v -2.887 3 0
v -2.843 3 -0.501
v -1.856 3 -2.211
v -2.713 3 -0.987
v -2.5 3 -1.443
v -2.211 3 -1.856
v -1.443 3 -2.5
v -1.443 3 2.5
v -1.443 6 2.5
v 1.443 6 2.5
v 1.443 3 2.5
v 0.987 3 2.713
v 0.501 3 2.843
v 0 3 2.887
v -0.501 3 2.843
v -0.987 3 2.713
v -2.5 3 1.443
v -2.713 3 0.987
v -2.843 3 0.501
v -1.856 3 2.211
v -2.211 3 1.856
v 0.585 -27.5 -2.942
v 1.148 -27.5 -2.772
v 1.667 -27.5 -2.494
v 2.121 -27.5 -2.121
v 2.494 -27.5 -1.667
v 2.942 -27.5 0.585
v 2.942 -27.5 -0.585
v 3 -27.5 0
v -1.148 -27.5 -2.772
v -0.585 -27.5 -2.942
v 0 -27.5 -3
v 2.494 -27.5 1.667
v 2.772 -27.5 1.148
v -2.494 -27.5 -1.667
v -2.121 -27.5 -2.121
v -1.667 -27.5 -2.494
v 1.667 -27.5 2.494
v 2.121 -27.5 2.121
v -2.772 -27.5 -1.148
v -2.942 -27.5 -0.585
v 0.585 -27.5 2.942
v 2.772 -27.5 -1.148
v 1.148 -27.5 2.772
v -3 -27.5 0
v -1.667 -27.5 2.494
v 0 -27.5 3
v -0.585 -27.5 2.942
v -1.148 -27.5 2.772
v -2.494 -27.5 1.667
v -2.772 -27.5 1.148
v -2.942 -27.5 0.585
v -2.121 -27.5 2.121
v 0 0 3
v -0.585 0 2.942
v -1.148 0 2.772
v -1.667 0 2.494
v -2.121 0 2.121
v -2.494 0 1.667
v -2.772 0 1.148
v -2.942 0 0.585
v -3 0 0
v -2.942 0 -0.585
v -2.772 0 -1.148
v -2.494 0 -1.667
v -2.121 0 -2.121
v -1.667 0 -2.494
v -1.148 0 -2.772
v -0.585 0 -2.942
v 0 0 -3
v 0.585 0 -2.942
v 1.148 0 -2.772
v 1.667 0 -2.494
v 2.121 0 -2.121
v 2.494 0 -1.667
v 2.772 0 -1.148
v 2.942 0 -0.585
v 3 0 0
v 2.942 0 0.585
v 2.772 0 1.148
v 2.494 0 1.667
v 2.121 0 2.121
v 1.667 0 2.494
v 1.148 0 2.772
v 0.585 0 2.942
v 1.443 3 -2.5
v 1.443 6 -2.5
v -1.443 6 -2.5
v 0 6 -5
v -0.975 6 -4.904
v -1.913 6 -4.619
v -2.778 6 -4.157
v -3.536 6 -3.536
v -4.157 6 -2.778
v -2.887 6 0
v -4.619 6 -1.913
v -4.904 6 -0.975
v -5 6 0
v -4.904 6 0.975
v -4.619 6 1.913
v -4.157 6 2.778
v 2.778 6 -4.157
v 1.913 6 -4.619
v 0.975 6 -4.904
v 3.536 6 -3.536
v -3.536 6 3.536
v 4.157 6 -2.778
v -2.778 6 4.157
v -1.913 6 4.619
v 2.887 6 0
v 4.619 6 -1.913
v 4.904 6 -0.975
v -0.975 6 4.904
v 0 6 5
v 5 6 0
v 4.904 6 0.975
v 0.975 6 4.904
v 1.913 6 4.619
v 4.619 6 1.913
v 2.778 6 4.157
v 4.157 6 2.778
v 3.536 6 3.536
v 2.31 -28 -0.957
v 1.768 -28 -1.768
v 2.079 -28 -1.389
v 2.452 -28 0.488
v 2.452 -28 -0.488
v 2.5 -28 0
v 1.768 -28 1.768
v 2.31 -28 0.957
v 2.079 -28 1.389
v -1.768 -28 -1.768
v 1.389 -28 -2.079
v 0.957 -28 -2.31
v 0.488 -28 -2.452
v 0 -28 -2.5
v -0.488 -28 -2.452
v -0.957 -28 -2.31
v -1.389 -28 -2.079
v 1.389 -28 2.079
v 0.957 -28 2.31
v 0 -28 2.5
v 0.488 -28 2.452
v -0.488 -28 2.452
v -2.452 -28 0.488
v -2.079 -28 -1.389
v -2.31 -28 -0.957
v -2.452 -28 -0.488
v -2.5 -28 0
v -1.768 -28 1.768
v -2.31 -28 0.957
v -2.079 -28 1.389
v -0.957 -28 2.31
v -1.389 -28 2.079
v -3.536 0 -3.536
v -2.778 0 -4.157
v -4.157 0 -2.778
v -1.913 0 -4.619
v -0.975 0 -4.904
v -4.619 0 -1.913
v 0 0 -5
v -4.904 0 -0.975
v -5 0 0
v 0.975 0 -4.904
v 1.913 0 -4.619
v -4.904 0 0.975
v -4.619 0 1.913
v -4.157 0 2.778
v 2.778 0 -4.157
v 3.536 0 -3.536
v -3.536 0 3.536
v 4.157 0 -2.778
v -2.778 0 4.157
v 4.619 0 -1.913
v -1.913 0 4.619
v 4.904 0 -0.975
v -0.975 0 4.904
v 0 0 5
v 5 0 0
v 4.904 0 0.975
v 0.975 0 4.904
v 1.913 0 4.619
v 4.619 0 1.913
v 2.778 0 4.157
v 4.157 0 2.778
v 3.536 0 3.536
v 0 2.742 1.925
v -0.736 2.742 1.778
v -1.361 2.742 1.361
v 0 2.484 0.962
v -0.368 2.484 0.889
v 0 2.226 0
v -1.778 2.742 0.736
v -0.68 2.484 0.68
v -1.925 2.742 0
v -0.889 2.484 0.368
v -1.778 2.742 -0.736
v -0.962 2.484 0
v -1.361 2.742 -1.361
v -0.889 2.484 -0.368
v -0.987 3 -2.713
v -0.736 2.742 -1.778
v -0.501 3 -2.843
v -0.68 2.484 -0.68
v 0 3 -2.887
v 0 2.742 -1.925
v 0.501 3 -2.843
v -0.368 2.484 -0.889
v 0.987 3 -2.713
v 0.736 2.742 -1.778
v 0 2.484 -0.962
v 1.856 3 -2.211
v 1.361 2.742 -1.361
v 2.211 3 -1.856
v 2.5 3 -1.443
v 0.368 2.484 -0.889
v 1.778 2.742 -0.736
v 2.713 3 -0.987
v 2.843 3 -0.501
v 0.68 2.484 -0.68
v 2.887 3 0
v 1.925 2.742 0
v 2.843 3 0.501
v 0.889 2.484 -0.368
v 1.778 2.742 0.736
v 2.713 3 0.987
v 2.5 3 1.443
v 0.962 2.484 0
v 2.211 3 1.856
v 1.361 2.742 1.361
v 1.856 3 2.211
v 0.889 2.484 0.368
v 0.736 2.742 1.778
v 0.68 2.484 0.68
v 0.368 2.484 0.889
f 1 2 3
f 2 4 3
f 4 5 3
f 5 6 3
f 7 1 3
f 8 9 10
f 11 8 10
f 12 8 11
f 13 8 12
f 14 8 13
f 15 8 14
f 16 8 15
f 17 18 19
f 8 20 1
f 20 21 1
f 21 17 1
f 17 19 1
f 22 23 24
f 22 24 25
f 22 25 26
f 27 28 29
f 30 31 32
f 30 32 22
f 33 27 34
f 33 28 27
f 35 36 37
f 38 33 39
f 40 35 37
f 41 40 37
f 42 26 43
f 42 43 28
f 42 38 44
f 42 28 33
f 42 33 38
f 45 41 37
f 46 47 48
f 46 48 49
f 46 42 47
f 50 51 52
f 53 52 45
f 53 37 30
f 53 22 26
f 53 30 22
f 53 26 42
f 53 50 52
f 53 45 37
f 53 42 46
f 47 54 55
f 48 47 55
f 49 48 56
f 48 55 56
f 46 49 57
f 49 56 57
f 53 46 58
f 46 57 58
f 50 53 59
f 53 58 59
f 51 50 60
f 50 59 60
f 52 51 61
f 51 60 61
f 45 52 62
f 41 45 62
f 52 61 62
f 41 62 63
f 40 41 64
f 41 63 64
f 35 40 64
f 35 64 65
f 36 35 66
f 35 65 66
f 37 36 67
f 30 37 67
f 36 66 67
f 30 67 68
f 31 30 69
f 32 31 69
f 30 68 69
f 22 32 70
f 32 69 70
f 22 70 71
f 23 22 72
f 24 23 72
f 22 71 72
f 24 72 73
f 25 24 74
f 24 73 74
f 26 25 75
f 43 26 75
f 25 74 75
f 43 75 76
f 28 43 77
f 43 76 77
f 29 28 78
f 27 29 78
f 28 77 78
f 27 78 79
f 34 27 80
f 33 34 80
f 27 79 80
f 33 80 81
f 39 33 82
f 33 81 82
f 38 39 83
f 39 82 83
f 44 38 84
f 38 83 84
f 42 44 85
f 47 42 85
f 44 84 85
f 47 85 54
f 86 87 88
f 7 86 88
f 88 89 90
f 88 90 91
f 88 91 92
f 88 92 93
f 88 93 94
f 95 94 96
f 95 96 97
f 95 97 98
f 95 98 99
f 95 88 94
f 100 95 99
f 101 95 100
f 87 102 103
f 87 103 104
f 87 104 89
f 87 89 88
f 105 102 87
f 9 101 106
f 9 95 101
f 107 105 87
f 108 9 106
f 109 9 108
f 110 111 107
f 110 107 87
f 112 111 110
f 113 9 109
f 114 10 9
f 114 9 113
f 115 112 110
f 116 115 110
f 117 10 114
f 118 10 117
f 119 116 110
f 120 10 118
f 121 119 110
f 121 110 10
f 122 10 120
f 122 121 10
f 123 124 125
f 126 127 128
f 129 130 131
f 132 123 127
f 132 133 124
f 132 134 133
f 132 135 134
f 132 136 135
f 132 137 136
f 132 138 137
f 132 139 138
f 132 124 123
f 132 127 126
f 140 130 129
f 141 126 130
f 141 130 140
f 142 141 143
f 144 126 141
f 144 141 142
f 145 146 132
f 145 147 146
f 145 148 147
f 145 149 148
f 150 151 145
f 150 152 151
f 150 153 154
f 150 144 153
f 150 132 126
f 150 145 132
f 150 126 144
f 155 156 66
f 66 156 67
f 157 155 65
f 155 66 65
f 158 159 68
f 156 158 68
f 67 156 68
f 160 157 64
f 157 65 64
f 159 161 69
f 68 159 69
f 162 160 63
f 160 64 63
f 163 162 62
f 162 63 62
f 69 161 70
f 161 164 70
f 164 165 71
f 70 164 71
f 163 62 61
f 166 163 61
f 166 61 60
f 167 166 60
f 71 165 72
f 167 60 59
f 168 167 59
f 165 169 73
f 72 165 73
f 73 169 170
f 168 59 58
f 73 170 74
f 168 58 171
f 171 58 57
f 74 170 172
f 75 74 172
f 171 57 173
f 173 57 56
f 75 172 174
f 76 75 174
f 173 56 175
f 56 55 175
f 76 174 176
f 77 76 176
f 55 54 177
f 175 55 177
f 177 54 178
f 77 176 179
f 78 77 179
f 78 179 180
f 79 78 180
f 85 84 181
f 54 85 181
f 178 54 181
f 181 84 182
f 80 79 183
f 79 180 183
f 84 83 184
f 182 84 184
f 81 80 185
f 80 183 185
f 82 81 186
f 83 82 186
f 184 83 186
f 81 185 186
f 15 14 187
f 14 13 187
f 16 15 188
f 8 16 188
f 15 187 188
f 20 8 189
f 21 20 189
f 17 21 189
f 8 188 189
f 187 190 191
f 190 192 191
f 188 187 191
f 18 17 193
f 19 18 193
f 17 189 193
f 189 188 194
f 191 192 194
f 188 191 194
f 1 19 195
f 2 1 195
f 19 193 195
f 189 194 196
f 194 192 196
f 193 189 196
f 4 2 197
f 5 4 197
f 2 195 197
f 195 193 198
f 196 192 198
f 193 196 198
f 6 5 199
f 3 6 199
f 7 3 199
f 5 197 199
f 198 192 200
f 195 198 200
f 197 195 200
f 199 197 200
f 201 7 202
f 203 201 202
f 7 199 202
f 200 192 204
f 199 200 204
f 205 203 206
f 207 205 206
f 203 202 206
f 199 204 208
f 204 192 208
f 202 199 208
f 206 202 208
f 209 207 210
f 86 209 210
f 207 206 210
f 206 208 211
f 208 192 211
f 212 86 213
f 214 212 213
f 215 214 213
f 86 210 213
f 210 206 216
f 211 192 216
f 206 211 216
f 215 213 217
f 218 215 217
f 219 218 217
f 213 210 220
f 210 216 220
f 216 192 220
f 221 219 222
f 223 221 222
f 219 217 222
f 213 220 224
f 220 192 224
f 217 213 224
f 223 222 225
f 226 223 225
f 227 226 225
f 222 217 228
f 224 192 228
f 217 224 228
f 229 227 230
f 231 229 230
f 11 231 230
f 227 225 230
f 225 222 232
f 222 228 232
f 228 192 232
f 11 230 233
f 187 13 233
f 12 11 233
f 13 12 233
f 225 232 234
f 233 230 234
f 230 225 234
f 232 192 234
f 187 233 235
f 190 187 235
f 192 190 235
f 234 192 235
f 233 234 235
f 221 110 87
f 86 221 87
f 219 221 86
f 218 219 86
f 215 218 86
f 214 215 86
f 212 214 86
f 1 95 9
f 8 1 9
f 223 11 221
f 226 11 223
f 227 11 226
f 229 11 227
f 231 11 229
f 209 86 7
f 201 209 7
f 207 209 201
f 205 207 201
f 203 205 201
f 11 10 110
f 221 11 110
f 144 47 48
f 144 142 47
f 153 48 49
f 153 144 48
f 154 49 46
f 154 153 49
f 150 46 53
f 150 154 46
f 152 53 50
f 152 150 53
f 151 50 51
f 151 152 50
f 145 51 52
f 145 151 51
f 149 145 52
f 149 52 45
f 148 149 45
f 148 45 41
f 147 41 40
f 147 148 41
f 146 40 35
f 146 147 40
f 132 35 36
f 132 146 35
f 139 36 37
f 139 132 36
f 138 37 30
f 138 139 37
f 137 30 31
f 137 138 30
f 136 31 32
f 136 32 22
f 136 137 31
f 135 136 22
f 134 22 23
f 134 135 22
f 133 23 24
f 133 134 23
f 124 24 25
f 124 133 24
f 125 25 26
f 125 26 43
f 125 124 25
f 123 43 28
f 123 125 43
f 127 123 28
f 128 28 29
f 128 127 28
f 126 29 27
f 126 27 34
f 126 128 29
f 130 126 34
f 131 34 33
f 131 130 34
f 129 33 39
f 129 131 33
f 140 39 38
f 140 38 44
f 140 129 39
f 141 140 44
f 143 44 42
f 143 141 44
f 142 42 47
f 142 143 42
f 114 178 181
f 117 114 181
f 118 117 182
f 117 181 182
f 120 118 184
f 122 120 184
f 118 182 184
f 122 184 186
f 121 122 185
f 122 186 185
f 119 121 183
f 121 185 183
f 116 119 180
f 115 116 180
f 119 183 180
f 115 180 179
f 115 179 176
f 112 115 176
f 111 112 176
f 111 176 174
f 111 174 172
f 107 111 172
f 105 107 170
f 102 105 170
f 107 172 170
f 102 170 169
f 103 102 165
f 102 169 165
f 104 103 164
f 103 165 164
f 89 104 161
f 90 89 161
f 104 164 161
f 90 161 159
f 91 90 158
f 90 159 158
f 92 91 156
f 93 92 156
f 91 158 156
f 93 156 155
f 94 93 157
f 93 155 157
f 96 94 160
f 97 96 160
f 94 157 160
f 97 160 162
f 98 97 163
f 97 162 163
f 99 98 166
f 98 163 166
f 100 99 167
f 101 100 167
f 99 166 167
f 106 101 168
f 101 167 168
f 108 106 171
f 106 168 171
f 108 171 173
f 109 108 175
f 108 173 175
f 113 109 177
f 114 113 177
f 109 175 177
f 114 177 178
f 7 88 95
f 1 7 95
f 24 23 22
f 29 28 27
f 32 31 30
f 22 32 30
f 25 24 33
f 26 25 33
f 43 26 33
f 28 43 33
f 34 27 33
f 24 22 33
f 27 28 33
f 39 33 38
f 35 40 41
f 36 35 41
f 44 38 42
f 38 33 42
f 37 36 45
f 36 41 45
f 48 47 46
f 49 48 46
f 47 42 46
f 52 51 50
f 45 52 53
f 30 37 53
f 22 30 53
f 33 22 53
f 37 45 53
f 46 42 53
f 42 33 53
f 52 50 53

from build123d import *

# Parameters (mm, degrees)
SKETCH1_R           = 5
BOSS_EXTRUDE1_DEPTH = 6
CUT_EXTRUDE1_DEPTH  = 3
SKETCH4_R           = 3
BOSS_EXTRUDE2_DEPTH = 27.5
SKETCH5_R           = 3
BOSS_EXTRUDE3_DEPTH = 0.5
BOSS_EXTRUDE3_TAPER = 45


with BuildPart() as part:
    # Sketch1 → Boss-Extrude1 (new body)
    with BuildSketch(Plane(origin=(0, 0, 0), x_dir=(1, 0, 0), z_dir=(0, 1, 0))):
        with Locations(Location((0, 0, 0), (0, 0, 270))):
            Circle(SKETCH1_R)
    extrude(amount=BOSS_EXTRUDE1_DEPTH)

    # Sketch2 → Cut-Extrude1 (cut)
    with BuildSketch(Plane(origin=(0, 6, 0), x_dir=(1, 0, 0), z_dir=(0, 1, 0))):
        Polygon((2.886751346, 0), (1.443375673, 2.5), (-1.443375673, 2.5), (-2.886751346, 0), (-1.443375673, -2.5), (1.443375673, -2.5), align=None)
    extrude(amount=-CUT_EXTRUDE1_DEPTH, mode=Mode.SUBTRACT)

    # Cut-Extrude5 cone 1 section (through the dimple's axis) → Cut-Extrude5 (revolve, cut)
    with BuildSketch(Plane(origin=(0, 3, 0), x_dir=(0, 0, 1), z_dir=(1, 0, 0))):
        Polygon((0, 0), (2.886751346, 0), (0, 0.773502692), align=None)
    revolve(axis=Axis((0, 3, 0), (0, -1, 0)), mode=Mode.SUBTRACT)

    # Sketch4 → Boss-Extrude2 (add)
    with BuildSketch(Plane.XZ):
        with Locations(Location((0, 0, 0), (0, 0, 90))):
            Circle(SKETCH4_R)
    extrude(amount=BOSS_EXTRUDE2_DEPTH)


with BuildPart() as body_2:
    # Sketch5 → Boss-Extrude3 (new body)
    with BuildSketch(Plane.XZ.offset(27.5)):
        with Locations(Location((0, 0, 0), (0, 0, 90))):
            Circle(SKETCH5_R)
    extrude(amount=BOSS_EXTRUDE3_DEPTH, taper=BOSS_EXTRUDE3_TAPER)


solid = Compound([part.part, body_2.part])
